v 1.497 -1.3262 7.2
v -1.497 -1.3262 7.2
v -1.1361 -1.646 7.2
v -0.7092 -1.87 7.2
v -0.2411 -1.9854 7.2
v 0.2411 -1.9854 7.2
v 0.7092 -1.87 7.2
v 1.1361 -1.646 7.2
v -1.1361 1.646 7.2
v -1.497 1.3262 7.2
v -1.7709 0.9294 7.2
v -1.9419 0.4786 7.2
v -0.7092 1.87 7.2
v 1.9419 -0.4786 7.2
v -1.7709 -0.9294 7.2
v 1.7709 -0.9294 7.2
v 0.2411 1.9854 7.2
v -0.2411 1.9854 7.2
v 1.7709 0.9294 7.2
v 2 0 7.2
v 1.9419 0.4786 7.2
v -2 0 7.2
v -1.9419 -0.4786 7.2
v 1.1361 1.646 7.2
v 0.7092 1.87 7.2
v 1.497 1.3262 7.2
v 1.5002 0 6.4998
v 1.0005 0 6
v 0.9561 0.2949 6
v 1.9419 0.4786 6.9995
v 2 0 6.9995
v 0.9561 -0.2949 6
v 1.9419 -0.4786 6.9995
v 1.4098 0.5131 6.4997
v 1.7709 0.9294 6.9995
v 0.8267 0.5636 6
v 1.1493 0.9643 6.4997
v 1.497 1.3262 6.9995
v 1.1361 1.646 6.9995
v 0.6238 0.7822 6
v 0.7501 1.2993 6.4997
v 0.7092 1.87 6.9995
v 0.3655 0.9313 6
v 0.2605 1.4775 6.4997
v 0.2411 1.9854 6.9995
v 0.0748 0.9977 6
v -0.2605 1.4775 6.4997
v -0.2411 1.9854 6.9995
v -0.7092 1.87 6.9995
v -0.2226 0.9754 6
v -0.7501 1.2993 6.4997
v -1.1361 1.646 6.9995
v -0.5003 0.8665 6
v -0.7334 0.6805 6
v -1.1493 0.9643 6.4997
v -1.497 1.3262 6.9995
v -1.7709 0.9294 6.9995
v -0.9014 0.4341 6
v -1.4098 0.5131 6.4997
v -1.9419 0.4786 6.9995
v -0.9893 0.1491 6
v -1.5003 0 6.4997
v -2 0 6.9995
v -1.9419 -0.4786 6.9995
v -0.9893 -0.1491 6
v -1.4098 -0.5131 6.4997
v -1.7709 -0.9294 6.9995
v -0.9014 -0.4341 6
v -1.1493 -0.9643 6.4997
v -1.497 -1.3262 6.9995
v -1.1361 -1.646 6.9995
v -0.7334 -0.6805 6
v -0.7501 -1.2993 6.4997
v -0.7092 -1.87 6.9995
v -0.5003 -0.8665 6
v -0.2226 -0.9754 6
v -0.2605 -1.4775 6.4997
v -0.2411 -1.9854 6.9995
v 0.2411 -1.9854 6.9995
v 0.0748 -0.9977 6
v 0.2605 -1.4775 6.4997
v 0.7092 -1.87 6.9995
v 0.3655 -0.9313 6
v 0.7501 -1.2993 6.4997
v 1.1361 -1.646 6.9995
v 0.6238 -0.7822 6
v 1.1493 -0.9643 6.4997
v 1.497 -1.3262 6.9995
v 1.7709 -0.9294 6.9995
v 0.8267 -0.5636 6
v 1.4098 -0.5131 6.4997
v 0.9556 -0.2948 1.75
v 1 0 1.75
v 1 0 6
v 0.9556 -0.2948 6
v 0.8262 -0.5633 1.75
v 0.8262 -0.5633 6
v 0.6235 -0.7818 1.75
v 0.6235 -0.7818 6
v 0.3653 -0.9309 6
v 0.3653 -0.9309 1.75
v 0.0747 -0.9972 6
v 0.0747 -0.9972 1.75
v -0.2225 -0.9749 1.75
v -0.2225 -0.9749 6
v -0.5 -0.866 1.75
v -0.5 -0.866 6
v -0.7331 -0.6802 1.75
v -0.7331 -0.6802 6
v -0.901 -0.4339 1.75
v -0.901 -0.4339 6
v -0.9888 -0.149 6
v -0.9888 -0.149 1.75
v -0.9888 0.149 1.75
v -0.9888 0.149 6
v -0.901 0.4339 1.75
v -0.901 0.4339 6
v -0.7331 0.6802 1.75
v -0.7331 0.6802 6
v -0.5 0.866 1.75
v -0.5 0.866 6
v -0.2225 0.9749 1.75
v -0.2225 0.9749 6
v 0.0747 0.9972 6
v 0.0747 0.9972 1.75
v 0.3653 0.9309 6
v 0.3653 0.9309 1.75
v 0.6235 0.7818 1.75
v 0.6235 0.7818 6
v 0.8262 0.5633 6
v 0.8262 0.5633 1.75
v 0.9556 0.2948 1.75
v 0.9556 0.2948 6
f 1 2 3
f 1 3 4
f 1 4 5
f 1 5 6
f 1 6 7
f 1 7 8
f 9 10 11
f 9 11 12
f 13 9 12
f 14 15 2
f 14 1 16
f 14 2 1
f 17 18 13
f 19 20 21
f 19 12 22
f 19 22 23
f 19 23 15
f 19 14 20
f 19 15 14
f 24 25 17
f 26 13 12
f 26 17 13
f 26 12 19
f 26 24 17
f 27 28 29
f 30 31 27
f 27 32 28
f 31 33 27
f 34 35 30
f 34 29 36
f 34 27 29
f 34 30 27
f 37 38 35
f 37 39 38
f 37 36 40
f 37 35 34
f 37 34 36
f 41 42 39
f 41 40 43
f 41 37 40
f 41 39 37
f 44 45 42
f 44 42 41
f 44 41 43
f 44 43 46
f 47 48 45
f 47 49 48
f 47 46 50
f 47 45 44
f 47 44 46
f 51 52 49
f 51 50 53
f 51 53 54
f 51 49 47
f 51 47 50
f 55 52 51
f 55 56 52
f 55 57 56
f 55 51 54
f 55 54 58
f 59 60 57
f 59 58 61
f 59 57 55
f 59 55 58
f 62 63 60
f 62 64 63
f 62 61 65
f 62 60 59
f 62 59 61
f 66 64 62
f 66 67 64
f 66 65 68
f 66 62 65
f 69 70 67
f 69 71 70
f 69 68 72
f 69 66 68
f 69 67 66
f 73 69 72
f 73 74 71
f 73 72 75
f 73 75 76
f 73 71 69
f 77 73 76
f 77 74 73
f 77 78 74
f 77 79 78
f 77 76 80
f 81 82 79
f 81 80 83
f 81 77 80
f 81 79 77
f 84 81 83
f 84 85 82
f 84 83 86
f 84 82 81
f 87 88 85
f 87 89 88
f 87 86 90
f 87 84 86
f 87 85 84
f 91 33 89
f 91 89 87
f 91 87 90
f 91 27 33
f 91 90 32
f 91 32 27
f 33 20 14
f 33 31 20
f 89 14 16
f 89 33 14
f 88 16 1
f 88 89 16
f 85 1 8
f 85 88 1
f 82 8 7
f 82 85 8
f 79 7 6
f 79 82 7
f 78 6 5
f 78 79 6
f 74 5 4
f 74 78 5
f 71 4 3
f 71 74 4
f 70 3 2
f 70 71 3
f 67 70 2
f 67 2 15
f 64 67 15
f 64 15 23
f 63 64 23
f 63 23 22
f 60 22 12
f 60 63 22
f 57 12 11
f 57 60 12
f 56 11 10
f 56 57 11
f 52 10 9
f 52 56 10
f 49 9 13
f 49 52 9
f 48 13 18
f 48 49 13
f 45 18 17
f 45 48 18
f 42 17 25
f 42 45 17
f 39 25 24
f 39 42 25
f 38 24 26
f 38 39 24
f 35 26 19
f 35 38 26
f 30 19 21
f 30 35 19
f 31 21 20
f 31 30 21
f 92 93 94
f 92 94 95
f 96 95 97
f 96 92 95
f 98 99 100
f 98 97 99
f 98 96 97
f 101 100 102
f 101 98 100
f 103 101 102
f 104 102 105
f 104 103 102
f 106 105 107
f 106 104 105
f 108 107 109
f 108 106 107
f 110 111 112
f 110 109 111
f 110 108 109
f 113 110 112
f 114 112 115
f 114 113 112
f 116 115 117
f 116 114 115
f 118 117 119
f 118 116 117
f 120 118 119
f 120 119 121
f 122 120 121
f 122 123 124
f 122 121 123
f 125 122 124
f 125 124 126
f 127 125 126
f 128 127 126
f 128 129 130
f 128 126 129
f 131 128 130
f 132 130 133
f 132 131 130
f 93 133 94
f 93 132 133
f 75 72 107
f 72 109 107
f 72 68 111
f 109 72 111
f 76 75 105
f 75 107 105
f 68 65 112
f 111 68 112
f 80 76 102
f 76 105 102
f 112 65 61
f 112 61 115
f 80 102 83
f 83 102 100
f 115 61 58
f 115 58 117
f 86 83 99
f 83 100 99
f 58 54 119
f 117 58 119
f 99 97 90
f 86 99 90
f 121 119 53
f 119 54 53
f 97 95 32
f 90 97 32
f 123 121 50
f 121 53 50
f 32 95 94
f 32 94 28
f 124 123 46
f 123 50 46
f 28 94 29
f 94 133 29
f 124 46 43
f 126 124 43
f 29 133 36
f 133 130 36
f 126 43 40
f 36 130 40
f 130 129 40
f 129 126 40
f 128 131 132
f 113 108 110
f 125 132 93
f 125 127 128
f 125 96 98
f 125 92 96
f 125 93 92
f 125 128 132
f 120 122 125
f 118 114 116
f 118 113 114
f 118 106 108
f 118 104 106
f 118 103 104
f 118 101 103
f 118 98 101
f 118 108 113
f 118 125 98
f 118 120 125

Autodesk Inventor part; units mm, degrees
ref_plane "YZ Plane" through (0, 0, 0) normal (1, 0, 0) x (0, 1, 0)
ref_plane "XZ Plane" through (0, 0, 0) normal (0, 1, 0) x (-1, 0, 0)
ref_plane "XY Plane" through (0, 0, 0) normal (0, 0, 1) x (1, 0, 0)
sketch "スケッチ1" plane through (0, 0, 0) normal (0, 0, 1) x (1, 0, 0)
  circle A0 centre (0, 0) radius 1
  dimension "d0" = 2
extrude "押し出し1" add sketch "スケッチ1" along normal blind 6
sketch "スケッチ2" plane through (0, 0, 6) normal (0, 0, 1) x (1, 0, 0)
  circle A0 centre (0, 0) radius 1 projected
  circle A1 centre (0, 0) radius 2
  dimension "d3" = 4
extrude "押し出し2" add sketch "スケッチ2" along normal blind 1.2 contours A0 | A1
thread "ねじ1" size "M3x0.5" class "6g" standard "ANSI Metric M Profile" full length
chamfer "面取り1" distance 1 angle 45 1 edges at (-2, 0, 6)
sketch "スケッチ4" plane through (0, 0, 0) normal (0, 0, -1) x (-1, 0, 0)
  circle A0 centre (0, 0) radius 1 projected
extrude "押し出し4" cut sketch "スケッチ4" against normal blind 1.75
properties part number "SB　M2 6mm皿ネジ" material "Steel, Mild"
